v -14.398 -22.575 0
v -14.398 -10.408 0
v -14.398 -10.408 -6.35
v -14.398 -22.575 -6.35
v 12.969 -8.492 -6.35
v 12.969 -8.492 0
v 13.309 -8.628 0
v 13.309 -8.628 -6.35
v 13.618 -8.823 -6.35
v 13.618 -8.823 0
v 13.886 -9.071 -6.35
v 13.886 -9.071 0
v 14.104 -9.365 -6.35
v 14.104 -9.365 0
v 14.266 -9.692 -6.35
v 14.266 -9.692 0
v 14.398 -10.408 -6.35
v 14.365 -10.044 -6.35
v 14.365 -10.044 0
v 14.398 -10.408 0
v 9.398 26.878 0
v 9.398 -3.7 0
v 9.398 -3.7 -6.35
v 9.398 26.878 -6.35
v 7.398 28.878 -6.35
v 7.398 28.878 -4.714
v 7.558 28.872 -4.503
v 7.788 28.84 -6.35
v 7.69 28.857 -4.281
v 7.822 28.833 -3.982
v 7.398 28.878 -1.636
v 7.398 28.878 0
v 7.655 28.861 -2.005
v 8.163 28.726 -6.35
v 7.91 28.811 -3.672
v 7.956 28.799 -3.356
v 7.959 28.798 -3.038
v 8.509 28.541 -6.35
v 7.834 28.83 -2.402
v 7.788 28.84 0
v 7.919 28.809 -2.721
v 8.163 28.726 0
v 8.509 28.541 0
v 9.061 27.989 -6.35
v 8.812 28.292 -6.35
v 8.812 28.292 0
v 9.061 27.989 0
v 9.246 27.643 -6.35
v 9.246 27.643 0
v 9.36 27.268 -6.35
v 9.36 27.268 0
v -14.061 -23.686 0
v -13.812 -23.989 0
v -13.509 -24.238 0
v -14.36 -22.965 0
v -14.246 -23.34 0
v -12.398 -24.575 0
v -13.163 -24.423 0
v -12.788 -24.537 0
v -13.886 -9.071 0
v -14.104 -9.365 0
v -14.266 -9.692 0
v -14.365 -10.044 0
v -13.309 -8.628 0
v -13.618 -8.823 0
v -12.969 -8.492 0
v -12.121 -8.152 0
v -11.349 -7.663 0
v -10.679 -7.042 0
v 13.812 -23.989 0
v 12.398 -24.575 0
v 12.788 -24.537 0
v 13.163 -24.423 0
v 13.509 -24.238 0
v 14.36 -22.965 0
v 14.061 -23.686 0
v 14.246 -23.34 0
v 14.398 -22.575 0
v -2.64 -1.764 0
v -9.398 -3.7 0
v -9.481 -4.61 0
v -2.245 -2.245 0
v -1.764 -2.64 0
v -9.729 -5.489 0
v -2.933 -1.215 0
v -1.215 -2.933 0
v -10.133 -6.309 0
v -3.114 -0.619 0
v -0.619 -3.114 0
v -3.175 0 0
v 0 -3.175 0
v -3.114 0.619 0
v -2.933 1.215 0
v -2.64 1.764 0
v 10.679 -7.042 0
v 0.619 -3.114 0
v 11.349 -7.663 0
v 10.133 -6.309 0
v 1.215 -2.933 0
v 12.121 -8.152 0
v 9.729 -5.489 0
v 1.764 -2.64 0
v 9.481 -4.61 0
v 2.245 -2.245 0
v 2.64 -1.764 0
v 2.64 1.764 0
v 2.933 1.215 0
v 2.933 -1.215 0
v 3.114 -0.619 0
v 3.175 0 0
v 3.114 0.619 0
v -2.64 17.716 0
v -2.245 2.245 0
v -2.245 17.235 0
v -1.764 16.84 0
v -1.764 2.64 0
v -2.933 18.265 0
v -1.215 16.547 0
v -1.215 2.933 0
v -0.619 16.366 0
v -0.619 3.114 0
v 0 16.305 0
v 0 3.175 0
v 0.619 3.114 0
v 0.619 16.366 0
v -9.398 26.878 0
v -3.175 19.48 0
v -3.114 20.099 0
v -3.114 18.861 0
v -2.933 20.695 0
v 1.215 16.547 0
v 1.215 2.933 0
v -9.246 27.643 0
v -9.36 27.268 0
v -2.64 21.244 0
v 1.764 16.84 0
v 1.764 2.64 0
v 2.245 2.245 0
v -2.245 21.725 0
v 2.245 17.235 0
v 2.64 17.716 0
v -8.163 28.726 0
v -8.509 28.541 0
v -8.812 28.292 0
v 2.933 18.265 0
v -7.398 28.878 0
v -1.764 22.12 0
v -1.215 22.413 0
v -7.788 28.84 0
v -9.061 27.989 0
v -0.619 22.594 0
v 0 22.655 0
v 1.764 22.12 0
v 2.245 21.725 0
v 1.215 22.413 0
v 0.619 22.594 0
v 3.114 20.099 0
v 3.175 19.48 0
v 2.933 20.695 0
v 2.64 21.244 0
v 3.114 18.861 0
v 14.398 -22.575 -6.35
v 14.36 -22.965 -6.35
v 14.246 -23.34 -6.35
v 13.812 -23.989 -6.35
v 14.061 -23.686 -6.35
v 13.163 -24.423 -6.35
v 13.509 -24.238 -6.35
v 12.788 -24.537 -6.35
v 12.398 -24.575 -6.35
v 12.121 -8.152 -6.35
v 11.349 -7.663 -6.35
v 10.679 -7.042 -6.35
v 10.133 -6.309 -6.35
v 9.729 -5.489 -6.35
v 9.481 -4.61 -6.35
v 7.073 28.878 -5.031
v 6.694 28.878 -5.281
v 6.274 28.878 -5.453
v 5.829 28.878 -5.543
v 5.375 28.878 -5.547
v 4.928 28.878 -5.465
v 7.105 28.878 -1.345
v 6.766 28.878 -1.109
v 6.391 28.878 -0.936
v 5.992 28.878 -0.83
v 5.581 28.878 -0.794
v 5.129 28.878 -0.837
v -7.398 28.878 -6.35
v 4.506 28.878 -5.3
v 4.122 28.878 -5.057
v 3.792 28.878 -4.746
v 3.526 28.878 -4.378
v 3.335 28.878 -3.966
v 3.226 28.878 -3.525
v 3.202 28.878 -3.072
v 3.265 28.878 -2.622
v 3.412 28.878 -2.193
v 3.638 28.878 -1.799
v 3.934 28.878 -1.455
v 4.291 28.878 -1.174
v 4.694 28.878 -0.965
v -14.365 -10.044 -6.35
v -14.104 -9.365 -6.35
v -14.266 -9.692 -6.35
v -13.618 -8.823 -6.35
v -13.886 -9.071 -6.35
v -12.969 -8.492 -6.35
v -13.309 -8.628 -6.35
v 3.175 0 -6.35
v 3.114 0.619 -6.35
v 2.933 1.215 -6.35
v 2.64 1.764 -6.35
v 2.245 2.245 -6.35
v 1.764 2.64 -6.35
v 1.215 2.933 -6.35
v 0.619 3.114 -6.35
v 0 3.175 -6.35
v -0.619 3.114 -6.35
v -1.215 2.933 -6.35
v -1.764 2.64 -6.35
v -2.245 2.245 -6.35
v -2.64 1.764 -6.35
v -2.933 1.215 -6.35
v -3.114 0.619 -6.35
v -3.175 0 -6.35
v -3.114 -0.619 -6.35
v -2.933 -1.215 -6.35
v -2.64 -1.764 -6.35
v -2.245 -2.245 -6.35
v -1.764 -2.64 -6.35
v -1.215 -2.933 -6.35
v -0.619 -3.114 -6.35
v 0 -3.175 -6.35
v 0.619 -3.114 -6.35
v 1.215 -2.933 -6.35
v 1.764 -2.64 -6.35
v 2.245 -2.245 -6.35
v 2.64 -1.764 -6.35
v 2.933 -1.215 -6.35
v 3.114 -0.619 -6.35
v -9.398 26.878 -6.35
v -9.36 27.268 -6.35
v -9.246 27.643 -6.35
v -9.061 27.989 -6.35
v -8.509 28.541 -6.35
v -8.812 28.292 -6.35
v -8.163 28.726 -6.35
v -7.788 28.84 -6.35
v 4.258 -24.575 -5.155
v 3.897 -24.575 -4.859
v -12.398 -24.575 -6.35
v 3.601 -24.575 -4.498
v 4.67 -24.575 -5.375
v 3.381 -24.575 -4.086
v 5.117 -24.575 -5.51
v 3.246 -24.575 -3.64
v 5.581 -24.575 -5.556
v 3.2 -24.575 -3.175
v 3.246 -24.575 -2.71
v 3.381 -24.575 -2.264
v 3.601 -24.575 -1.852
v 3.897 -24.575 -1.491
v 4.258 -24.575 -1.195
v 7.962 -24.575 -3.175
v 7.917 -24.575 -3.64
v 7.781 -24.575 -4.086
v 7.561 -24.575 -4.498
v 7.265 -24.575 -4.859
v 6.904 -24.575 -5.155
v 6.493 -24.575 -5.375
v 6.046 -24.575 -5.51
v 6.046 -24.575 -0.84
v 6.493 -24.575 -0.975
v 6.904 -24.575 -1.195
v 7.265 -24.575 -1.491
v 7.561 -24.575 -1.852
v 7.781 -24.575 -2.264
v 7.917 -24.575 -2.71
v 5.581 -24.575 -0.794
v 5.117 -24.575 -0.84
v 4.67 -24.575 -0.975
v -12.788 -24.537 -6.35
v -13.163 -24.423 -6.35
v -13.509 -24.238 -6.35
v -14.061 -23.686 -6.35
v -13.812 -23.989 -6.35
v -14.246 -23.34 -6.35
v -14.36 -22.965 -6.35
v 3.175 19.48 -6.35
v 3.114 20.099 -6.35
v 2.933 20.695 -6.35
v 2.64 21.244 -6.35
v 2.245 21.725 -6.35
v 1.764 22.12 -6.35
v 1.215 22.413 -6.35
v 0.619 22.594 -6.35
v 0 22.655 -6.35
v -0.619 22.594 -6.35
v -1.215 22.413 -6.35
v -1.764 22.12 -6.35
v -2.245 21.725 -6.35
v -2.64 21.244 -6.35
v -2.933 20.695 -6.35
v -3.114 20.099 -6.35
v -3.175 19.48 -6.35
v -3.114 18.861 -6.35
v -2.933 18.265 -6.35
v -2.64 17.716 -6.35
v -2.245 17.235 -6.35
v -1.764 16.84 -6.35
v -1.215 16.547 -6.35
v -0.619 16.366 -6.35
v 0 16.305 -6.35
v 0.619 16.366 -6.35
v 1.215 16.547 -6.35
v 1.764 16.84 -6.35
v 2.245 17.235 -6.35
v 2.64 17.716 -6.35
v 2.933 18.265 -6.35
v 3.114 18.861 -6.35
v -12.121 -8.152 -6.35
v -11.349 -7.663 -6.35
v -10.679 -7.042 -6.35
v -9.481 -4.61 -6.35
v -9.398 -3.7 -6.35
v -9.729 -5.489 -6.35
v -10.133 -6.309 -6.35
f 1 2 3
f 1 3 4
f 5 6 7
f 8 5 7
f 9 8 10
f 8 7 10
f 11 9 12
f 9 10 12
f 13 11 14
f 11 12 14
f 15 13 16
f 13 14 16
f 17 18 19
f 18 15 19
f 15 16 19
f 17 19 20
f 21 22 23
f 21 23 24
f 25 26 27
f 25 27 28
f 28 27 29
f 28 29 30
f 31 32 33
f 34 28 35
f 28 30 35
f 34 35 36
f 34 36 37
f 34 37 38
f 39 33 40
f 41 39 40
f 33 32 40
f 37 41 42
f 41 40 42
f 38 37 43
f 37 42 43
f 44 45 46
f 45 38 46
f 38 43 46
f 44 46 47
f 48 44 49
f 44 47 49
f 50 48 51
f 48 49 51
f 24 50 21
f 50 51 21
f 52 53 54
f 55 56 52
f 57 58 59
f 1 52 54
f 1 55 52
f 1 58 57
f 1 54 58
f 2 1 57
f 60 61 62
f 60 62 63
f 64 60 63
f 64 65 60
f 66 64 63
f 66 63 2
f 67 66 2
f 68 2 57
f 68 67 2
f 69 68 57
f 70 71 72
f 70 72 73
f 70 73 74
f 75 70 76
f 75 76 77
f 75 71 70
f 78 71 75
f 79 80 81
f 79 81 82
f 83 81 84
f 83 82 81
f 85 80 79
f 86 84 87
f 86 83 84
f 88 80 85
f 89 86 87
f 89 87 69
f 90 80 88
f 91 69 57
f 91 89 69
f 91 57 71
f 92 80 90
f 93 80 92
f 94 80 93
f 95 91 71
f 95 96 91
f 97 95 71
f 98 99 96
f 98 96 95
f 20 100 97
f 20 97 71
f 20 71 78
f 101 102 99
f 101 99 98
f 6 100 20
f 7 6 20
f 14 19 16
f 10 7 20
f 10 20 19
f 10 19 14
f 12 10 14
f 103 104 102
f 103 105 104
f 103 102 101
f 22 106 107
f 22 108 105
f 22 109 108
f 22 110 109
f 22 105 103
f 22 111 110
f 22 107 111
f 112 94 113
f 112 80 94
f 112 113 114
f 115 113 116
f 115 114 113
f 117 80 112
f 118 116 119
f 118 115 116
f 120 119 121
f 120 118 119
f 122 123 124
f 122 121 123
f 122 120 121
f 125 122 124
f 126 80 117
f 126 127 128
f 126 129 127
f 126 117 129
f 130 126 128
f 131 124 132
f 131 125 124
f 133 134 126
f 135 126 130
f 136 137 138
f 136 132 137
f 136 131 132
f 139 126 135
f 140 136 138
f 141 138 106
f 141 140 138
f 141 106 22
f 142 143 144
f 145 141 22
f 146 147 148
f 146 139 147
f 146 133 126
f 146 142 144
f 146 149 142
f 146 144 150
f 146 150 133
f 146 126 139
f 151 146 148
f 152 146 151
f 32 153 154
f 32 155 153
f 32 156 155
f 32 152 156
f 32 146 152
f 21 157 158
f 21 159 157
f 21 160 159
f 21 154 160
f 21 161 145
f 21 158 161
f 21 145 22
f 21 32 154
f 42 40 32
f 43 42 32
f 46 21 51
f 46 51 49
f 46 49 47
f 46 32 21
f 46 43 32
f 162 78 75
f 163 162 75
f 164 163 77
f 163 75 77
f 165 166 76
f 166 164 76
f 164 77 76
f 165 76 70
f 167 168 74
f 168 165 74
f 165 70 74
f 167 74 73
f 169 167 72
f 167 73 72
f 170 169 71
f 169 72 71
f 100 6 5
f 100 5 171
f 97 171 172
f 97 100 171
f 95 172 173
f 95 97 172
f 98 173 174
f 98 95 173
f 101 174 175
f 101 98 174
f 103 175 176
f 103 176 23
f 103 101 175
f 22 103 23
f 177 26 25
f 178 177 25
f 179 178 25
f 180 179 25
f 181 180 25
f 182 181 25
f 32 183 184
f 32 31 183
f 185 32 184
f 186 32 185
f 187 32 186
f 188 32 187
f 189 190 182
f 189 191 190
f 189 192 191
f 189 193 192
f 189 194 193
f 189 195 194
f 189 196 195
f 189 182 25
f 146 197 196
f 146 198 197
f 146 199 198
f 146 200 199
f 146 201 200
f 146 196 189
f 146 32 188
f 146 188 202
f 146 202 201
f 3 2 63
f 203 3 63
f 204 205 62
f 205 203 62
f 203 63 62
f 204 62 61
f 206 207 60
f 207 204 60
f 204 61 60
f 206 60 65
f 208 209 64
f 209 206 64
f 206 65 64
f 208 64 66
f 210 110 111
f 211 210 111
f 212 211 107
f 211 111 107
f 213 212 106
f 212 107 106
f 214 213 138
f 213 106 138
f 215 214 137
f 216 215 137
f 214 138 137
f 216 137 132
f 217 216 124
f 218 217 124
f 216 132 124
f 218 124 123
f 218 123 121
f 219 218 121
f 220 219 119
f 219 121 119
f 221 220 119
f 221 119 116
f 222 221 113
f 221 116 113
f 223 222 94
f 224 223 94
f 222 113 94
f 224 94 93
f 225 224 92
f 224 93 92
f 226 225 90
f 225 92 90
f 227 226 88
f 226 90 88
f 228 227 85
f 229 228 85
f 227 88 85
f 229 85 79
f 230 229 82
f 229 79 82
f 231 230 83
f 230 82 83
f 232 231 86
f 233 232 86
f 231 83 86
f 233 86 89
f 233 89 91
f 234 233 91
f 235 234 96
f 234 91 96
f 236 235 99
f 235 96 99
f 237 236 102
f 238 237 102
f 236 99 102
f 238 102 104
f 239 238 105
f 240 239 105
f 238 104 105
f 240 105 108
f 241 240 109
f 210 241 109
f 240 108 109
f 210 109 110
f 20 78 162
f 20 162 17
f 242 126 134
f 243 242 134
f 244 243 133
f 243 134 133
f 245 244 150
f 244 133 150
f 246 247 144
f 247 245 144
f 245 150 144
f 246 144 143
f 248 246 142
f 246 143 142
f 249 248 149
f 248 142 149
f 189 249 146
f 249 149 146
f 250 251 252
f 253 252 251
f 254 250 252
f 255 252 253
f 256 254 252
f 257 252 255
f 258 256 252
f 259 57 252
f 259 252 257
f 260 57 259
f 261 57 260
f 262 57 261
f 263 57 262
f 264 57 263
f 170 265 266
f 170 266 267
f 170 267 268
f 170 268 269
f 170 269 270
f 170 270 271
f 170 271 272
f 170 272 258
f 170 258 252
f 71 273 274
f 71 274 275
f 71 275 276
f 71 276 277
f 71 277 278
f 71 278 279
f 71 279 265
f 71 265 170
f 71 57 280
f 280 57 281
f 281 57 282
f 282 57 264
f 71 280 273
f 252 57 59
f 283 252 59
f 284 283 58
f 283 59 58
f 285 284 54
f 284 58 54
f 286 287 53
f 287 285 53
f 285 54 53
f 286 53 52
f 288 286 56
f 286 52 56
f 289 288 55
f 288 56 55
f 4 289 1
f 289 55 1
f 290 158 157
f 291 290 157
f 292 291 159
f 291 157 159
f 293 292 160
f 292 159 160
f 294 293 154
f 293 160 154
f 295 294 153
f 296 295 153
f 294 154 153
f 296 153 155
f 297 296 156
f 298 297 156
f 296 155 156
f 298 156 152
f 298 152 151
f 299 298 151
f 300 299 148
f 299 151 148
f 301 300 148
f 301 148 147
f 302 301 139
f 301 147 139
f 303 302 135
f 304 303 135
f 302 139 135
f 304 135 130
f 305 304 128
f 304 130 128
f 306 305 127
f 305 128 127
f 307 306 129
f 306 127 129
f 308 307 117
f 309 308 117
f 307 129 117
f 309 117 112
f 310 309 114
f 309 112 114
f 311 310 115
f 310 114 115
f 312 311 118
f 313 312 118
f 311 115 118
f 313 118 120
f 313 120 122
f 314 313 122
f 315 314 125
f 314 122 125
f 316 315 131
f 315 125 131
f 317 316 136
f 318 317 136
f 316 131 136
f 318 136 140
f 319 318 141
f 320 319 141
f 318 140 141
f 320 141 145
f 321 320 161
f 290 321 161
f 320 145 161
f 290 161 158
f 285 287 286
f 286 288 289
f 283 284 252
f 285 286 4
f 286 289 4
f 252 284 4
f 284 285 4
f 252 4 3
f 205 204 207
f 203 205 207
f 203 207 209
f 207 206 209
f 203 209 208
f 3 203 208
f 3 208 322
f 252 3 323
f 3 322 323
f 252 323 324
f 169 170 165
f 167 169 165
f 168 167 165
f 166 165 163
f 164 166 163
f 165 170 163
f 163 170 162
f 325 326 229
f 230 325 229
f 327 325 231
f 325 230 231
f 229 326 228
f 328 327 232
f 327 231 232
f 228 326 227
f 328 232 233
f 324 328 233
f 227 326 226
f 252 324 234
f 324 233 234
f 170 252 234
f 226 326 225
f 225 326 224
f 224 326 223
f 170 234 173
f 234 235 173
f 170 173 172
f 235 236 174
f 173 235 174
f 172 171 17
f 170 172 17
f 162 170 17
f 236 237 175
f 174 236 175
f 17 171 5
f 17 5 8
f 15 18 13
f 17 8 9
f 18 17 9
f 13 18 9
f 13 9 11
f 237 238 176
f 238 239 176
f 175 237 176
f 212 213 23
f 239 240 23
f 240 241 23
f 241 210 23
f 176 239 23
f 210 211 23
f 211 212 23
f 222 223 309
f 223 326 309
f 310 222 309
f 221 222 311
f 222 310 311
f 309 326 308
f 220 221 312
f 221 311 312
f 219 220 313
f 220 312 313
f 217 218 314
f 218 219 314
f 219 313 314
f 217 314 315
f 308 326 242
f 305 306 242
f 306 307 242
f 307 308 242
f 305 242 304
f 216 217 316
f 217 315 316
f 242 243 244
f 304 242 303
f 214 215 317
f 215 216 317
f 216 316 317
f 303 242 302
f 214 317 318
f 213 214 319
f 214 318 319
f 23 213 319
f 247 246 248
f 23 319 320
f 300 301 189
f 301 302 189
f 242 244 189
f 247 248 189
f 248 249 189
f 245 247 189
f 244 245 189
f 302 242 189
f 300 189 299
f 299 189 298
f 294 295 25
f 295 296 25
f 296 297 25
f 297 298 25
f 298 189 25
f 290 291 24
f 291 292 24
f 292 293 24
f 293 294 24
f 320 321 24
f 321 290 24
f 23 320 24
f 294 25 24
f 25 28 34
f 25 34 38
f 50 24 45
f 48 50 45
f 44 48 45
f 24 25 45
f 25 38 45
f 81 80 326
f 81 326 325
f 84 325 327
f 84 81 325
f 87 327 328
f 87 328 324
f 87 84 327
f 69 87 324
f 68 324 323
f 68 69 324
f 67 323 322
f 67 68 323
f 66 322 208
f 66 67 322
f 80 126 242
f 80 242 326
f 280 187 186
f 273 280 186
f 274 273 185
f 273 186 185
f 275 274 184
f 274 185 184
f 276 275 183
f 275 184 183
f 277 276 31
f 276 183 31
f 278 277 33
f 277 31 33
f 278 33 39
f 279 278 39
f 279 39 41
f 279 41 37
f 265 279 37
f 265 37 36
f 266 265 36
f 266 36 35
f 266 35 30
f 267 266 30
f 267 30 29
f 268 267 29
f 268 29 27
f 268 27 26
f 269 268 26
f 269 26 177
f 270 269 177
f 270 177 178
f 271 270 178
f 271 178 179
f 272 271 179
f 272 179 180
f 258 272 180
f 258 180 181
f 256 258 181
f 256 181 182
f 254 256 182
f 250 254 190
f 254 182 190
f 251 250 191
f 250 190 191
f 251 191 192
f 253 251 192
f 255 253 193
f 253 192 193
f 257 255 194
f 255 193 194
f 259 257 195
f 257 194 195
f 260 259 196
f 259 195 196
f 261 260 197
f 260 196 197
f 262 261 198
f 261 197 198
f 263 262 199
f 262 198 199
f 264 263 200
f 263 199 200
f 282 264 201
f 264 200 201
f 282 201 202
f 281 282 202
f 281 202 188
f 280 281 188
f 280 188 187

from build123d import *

# Parameters (mm, degrees)
SKETCH1_R           = 3.175
BOSS_EXTRUDE1_DEPTH = 6.35
SKETCH2_R           = 2.38125
CUT_EXTRUDE2_DEPTH  = 56.721163959
FILLET1_R           = 2


with BuildPart() as part:
    # Sketch1 → Boss-Extrude1 (new body)
    with BuildSketch(Plane.XY):
        with BuildLine():
            Line((9.398, -3.7), (9.398, 28.878))
            Line((9.398, 28.878), (-9.398, 28.878))
            Line((-9.398, 28.878), (-9.398, -3.7))
            ThreePointArc((-9.398, -3.7), (-10.862466094, -7.235533906), (-14.398, -8.7))
            Line((-14.398, -8.7), (-14.398, -24.575))
            Line((-14.398, -24.575), (14.398, -24.575))
            Line((14.398, -24.575), (14.398, -8.7))
            ThreePointArc((14.398, -8.7), (10.862466094, -7.235533906), (9.398, -3.7))
        make_face()
        Circle(SKETCH1_R, mode=Mode.SUBTRACT)
        with Locations((0, 19.48)):
            Circle(SKETCH1_R, mode=Mode.SUBTRACT)
    extrude(amount=-BOSS_EXTRUDE1_DEPTH)

    # Sketch2 → Cut-Extrude2 (cut, through all)
    with BuildSketch(Plane(origin=(0, 28.878, 0), x_dir=(1, 0, 0), z_dir=(0, 1, 0))):
        with Locations(Location((5.58125, 3.175, 0), (0, 0, 270))):
            Circle(SKETCH2_R)
    extrude(amount=-CUT_EXTRUDE2_DEPTH, mode=Mode.SUBTRACT)

    # Fillet1
    # the kernel refuses this fillet: 2 mm, written as the material it takes off along each edge
    with BuildSketch(Plane(origin=(-9.398, 28.878, 5), x_dir=(1, 0, 0), z_dir=(0, 0, -1)), Plane(origin=(9.398, 28.878, 5), x_dir=(0, -1, 0), z_dir=(0, 0, -1)), Plane(origin=(-14.398, -24.575, 5), x_dir=(0, 1, 0), z_dir=(0, 0, -1))) as fillet1_piece_1:
        with BuildLine():
            CenterArc((FILLET1_R, FILLET1_R), FILLET1_R, 180, 90)
            Line((0, FILLET1_R), (0, 0))
            Line((0, 0), (FILLET1_R, 0))
        make_face()
    extrude(amount=16.35, mode=Mode.SUBTRACT)
    with BuildSketch(Plane(origin=(14.398, -8.7, 4.270509831), x_dir=(-0.9895238368781003, 0.14436958214957393, 0), z_dir=(0, 0, -1))) as fillet1_piece_2:
        with BuildLine():
            CenterArc((1.732434986, -1.979047674), FILLET1_R, 98.3007748, 73.398450401)
            Line((-0.246612688, -1.690308509), (0, 0))
            ThreePointArc((0, 0), (0.721847911, -0.052380816), (1.443695821, 0))
        make_face()
    extrude(amount=14.891019662, mode=Mode.SUBTRACT)
    with BuildSketch(Plane(origin=(14.398, -24.575, 5), x_dir=(0, 1, 0), z_dir=(0, 0, -1))) as fillet1_piece_3:
        with BuildLine():
            CenterArc((FILLET1_R, -FILLET1_R), FILLET1_R, 90, 90)
            Line((0, -FILLET1_R), (0, 0))
            Line((0, 0), (FILLET1_R, 0))
        make_face()
    extrude(amount=16.35, mode=Mode.SUBTRACT)
    with BuildSketch(Plane(origin=(-14.398, -8.7, 4.270509831), x_dir=(0.9895238368781003, 0.14436958214957393, 0), z_dir=(0, 0, -1))) as fillet1_piece_4:
        with BuildLine():
            CenterArc((1.732434986, 1.979047674), FILLET1_R, 188.300774799, 73.398450401)
            Line((-0.246612688, 1.690308509), (0, 0))
            ThreePointArc((0, 0), (0.721847911, 0.052380816), (1.443695821, 0))
        make_face()
    extrude(amount=14.891019662, mode=Mode.SUBTRACT)


solid = part.part
